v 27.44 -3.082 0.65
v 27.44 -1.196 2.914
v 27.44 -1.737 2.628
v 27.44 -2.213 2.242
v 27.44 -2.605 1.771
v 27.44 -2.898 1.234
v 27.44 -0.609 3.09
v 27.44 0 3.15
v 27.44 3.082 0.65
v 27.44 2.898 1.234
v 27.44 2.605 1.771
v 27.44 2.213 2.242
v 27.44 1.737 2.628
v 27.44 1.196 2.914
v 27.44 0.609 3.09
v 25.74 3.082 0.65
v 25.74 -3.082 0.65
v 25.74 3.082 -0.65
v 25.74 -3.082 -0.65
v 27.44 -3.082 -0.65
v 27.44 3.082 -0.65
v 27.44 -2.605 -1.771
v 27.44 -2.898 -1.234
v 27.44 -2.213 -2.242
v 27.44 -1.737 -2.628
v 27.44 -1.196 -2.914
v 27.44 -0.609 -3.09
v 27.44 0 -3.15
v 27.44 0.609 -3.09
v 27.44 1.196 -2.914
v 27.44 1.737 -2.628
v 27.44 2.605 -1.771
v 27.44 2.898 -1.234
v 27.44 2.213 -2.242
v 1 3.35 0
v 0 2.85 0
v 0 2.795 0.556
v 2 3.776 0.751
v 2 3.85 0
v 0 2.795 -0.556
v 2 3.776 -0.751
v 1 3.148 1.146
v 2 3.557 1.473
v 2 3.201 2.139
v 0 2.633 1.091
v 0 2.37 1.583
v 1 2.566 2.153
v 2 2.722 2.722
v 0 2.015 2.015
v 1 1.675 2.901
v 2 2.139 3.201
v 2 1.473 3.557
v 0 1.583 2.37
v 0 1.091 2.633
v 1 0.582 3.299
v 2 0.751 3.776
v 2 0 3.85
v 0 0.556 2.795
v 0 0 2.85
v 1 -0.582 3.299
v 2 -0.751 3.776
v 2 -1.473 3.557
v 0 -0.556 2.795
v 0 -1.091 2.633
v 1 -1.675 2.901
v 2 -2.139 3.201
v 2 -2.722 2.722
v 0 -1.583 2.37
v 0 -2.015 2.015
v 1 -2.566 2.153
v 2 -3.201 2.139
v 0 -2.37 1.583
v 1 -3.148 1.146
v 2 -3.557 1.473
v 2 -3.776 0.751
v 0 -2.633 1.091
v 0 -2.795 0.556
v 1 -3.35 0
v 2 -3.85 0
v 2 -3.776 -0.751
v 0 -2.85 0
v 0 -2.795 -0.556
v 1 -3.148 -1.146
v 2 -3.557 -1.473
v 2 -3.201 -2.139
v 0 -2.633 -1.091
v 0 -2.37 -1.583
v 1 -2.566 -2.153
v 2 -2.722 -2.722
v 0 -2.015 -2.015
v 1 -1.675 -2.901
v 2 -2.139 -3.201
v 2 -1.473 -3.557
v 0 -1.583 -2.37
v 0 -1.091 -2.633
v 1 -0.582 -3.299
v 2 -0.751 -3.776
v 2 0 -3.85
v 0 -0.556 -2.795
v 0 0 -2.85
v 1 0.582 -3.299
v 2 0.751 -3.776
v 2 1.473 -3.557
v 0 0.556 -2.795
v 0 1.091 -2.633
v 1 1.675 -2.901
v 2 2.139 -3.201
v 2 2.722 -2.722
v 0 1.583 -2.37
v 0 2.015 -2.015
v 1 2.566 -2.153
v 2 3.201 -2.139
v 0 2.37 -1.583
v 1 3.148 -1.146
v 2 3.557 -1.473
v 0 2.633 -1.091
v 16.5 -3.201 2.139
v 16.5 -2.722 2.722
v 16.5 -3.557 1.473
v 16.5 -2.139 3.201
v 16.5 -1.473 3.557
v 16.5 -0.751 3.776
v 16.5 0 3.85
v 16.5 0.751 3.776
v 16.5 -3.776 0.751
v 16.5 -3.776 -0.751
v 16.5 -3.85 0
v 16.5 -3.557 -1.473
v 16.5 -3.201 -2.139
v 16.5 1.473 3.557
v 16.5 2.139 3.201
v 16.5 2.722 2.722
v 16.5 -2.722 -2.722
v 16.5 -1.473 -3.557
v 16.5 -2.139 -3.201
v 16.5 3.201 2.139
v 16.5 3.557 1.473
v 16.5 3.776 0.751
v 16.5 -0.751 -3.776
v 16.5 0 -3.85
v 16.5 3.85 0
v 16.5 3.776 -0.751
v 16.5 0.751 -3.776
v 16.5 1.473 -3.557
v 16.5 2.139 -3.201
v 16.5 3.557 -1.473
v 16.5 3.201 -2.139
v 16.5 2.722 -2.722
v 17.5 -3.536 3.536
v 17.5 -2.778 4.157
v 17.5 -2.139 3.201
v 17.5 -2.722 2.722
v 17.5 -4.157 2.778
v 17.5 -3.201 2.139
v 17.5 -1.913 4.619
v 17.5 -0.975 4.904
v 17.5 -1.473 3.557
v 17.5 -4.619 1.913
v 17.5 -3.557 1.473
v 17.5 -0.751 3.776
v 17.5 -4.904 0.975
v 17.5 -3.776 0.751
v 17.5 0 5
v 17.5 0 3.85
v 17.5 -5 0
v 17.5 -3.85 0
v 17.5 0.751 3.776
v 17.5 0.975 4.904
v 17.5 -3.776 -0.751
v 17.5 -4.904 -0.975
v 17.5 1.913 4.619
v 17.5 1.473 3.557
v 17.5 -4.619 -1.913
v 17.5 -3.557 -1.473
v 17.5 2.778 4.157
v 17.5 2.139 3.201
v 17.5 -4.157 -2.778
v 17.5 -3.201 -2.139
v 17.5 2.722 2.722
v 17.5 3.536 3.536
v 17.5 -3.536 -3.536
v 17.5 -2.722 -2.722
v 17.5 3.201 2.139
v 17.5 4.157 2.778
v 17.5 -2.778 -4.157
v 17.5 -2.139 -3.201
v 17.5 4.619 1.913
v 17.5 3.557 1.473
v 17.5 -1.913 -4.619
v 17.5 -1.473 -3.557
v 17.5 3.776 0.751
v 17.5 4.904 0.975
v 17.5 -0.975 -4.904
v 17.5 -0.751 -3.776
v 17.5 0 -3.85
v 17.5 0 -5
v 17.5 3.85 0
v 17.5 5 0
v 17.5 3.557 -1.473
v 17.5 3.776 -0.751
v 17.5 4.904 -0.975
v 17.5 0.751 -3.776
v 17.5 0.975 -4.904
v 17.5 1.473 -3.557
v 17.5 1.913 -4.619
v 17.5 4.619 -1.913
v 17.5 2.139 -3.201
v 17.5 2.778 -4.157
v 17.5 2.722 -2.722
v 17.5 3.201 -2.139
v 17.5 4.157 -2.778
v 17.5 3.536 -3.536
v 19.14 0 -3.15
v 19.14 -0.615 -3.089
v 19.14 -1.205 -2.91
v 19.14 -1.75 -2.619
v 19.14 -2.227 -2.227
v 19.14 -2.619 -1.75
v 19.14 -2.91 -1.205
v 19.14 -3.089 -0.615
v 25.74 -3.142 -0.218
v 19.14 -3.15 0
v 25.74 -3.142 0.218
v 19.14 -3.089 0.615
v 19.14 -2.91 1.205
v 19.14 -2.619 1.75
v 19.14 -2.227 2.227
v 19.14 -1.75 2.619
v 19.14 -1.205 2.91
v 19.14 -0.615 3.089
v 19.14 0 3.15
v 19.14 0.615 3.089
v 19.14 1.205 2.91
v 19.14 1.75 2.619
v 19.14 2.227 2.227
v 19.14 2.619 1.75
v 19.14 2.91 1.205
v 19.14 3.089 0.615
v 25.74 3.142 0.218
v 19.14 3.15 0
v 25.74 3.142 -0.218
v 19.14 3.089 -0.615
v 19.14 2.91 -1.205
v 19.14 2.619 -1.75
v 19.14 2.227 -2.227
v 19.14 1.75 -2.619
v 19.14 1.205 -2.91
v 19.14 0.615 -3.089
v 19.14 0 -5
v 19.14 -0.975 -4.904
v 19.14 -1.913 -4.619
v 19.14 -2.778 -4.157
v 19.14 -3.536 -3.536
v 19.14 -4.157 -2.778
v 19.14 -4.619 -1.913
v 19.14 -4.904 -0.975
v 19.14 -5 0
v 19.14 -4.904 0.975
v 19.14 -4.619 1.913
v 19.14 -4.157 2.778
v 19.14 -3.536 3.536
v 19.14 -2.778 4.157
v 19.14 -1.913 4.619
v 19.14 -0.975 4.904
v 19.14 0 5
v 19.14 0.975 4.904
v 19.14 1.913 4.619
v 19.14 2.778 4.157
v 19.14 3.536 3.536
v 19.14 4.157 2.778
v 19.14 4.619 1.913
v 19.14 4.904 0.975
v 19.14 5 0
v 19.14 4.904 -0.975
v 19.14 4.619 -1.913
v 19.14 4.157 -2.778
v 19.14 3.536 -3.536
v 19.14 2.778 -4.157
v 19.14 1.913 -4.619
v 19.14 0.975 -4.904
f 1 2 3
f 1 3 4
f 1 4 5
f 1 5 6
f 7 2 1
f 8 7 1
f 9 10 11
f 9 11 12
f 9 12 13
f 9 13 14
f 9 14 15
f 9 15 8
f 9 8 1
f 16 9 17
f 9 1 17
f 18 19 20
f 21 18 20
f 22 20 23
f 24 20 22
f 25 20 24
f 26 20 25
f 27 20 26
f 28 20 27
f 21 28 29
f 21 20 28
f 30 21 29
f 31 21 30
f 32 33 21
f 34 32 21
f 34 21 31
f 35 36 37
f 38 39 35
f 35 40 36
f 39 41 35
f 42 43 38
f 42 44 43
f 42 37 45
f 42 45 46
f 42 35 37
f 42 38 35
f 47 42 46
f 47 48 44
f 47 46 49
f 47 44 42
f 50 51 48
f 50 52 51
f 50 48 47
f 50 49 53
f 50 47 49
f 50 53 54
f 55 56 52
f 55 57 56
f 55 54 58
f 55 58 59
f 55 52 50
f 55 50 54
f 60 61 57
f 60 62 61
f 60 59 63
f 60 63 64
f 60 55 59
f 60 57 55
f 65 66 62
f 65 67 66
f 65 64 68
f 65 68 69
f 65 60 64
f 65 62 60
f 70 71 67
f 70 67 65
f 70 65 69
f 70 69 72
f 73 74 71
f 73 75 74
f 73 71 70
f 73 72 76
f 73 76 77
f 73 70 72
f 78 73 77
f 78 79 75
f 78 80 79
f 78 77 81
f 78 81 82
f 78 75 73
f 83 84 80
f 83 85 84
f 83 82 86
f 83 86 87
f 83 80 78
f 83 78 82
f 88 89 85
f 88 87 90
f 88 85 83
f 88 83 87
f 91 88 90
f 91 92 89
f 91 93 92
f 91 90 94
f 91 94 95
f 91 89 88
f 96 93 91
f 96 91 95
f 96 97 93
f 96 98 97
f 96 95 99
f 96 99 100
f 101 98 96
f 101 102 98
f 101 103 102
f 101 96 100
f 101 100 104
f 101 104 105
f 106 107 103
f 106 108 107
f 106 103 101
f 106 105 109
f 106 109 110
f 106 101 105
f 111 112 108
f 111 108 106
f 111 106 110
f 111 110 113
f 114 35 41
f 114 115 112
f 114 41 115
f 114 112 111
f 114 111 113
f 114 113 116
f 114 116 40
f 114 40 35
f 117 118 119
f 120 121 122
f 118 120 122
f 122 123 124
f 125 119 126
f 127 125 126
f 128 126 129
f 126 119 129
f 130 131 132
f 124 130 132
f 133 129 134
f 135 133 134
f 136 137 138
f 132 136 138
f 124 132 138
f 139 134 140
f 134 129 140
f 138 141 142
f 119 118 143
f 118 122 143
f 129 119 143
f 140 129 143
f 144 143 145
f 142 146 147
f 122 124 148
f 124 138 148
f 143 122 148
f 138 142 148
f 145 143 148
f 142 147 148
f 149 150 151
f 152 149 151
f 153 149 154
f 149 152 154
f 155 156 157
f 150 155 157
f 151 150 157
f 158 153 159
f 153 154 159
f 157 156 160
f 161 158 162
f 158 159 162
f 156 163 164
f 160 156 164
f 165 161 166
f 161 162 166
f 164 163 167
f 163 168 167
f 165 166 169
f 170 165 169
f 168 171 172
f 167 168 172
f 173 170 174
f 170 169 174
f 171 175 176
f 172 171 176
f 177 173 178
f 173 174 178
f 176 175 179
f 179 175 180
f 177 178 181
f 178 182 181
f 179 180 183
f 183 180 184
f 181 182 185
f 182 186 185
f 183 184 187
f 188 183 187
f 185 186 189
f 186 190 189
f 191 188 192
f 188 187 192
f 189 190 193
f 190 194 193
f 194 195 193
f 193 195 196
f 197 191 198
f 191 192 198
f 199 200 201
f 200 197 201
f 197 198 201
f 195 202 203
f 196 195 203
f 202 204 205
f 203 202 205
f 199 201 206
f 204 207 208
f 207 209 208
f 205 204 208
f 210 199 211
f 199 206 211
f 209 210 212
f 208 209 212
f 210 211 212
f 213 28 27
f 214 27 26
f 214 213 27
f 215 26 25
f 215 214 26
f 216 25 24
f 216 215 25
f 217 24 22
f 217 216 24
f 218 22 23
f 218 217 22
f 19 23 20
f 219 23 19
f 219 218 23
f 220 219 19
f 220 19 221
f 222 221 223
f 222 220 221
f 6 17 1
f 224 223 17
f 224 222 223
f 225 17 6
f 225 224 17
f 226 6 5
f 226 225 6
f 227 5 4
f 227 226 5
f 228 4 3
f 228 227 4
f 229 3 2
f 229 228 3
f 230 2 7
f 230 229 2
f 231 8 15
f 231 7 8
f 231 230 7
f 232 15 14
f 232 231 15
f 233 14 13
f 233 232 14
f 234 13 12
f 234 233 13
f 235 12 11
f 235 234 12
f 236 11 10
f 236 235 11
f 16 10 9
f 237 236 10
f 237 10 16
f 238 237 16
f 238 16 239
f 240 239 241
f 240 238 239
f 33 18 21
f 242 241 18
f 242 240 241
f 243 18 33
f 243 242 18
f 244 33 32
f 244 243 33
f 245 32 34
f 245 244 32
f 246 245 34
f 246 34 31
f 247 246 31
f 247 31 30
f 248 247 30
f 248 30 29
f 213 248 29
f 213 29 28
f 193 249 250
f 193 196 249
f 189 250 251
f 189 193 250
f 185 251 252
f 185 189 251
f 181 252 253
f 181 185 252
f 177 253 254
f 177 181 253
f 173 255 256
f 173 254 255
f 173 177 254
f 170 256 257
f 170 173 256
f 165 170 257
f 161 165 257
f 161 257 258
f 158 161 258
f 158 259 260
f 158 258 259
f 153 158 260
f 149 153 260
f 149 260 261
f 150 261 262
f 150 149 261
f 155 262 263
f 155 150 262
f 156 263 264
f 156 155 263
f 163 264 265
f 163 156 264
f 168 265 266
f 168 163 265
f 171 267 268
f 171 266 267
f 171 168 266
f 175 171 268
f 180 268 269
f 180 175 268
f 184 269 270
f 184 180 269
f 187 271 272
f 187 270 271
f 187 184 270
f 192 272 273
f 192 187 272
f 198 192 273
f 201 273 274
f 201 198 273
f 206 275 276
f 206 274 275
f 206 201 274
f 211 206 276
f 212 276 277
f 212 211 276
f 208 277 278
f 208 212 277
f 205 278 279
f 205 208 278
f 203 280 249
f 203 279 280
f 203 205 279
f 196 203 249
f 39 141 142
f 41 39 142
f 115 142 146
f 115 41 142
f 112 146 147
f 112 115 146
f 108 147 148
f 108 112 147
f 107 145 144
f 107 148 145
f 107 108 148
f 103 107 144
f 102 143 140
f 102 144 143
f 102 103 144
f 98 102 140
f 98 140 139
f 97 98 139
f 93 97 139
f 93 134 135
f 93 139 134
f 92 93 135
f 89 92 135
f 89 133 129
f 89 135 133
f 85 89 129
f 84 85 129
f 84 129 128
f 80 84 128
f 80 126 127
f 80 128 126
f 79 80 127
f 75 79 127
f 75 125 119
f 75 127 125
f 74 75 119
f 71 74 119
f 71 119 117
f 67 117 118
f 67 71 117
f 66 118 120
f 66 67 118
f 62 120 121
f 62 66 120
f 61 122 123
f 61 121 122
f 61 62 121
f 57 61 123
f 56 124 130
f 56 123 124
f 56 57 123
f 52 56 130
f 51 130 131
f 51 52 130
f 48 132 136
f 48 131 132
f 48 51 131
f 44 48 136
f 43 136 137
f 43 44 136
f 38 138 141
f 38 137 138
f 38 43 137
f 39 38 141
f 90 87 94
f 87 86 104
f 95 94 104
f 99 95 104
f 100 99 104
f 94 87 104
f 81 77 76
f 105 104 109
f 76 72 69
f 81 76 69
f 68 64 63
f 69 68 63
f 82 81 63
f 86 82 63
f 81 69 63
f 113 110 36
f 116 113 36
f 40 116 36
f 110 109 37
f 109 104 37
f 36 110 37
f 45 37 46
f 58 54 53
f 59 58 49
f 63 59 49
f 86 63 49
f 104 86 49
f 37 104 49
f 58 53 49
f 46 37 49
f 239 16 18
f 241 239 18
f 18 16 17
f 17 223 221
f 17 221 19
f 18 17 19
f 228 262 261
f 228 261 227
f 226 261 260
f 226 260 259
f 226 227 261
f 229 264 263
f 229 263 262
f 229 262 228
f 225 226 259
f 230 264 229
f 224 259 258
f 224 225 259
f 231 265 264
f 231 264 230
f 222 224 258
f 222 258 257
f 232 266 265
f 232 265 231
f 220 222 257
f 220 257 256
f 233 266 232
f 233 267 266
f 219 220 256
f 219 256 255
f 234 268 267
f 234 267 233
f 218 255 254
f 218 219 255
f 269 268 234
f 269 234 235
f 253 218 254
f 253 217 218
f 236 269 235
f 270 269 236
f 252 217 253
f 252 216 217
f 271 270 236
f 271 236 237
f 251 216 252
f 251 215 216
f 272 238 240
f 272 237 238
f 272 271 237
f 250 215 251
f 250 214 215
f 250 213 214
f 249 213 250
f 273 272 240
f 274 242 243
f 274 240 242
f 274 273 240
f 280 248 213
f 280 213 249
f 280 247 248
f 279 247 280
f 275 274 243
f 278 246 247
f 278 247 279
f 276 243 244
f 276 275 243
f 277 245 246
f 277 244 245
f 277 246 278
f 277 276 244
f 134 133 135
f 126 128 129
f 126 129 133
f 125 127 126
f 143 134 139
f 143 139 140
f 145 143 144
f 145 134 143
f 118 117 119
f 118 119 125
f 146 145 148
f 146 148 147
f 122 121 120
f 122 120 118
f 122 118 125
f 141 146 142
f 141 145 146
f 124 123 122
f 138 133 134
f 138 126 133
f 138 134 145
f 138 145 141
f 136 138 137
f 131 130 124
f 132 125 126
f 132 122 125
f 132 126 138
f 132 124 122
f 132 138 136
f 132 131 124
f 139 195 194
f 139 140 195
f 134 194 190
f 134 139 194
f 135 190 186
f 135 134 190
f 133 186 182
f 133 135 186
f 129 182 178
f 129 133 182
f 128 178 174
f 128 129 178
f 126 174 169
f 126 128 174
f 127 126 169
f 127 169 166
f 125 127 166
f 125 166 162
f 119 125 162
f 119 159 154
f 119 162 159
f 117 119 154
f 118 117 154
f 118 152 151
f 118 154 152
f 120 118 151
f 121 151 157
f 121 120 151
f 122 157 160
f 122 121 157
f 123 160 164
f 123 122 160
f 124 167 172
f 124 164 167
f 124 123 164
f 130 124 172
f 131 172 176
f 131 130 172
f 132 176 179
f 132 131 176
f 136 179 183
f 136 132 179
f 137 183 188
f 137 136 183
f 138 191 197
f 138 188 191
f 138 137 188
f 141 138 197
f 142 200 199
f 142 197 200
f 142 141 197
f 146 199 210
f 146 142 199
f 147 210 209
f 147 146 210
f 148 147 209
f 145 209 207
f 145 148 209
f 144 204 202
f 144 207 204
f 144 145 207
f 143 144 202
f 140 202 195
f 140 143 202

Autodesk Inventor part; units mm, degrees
ref_plane "YZ Plane" through (0, 0, 0) normal (1, 0, 0) x (0, 1, 0)
ref_plane "XZ Plane" through (0, 0, 0) normal (0, 1, 0) x (-1, 0, 0)
ref_plane "XY Plane" through (0, 0, 0) normal (0, 0, 1) x (1, 0, 0)
sketch "Sketch1" plane through (0, 0, 0) normal (1, 0, 0) x (0, 1, 0)
  circle A0 centre (0, 0) radius 3.85
  dimension "d0" = 7.7
extrude "Extrusion1" add sketch "Sketch1" along normal blind 16.5
chamfer "Chamfer1" distance 2 distance2 1 1 edges at (0, -3.85, 0) measured on face at (11, 3.8375, -0.3098)
thread "Thread1" size "M8x1.25" class "6g" standard "ANSI Metric M Profile" full length
sketch "Sketch2" plane through (16.5, 0, 0) normal (1, 0, 0) x (0, 0, -1)
  circle A0 centre (0, 0) radius 3.85 projected
extrude "Extrusion2" add sketch "Sketch2" along normal blind 1 separate body
sketch "Sketch3" plane through (17.5, 0, 0) normal (1, 0, 0) x (0, 0, -1)
  circle A0 centre (0, 0) radius 5
  dimension "d10" = 10
extrude "Extrusion3" add sketch "Sketch3" along normal blind 1.64 bodies 2
sketch "Sketch4" plane through (19.14, 0, 0) normal (1, 0, 0) x (0, 0, -1)
  circle A0 centre (0, 0) radius 3.15
  dimension "d13" = 6.3
extrude "Extrusion4" add sketch "Sketch4" along normal blind 8.3 bodies 2
sketch "Sketch5" plane through (0, 0, 0) normal (0, 1, 0) x (-1, 0, 0)
  line L0 (-29.14, 0.65) -> (-25.74, 0.65)
  line L1 (-25.74, 0.65) -> (-25.74, -0.65)
  line L2 (-25.74, -0.65) -> (-29.14, -0.65)
  line L3 (-29.14, -0.65) -> (-29.14, 0.65)
  line L4 (-27.44, 3.15) -> (-27.44, -3.15) projected
  line L5 (-29.14, 0.65) -> (-25.74, -0.65) construction
  line L6 (-25.74, 0.65) -> (-29.14, -0.65) construction
  point P0 (0, 0)
  point P1 (-27.44, 0)
  dimension "d16" = 3.4
  dimension "d17" = 1.3
extrude "Extrusion5" cut sketch "Sketch5" along normal through all both and the other way through all bodies 2
properties part number "Parafuso da Ponte" material "Aluminum 6061"
